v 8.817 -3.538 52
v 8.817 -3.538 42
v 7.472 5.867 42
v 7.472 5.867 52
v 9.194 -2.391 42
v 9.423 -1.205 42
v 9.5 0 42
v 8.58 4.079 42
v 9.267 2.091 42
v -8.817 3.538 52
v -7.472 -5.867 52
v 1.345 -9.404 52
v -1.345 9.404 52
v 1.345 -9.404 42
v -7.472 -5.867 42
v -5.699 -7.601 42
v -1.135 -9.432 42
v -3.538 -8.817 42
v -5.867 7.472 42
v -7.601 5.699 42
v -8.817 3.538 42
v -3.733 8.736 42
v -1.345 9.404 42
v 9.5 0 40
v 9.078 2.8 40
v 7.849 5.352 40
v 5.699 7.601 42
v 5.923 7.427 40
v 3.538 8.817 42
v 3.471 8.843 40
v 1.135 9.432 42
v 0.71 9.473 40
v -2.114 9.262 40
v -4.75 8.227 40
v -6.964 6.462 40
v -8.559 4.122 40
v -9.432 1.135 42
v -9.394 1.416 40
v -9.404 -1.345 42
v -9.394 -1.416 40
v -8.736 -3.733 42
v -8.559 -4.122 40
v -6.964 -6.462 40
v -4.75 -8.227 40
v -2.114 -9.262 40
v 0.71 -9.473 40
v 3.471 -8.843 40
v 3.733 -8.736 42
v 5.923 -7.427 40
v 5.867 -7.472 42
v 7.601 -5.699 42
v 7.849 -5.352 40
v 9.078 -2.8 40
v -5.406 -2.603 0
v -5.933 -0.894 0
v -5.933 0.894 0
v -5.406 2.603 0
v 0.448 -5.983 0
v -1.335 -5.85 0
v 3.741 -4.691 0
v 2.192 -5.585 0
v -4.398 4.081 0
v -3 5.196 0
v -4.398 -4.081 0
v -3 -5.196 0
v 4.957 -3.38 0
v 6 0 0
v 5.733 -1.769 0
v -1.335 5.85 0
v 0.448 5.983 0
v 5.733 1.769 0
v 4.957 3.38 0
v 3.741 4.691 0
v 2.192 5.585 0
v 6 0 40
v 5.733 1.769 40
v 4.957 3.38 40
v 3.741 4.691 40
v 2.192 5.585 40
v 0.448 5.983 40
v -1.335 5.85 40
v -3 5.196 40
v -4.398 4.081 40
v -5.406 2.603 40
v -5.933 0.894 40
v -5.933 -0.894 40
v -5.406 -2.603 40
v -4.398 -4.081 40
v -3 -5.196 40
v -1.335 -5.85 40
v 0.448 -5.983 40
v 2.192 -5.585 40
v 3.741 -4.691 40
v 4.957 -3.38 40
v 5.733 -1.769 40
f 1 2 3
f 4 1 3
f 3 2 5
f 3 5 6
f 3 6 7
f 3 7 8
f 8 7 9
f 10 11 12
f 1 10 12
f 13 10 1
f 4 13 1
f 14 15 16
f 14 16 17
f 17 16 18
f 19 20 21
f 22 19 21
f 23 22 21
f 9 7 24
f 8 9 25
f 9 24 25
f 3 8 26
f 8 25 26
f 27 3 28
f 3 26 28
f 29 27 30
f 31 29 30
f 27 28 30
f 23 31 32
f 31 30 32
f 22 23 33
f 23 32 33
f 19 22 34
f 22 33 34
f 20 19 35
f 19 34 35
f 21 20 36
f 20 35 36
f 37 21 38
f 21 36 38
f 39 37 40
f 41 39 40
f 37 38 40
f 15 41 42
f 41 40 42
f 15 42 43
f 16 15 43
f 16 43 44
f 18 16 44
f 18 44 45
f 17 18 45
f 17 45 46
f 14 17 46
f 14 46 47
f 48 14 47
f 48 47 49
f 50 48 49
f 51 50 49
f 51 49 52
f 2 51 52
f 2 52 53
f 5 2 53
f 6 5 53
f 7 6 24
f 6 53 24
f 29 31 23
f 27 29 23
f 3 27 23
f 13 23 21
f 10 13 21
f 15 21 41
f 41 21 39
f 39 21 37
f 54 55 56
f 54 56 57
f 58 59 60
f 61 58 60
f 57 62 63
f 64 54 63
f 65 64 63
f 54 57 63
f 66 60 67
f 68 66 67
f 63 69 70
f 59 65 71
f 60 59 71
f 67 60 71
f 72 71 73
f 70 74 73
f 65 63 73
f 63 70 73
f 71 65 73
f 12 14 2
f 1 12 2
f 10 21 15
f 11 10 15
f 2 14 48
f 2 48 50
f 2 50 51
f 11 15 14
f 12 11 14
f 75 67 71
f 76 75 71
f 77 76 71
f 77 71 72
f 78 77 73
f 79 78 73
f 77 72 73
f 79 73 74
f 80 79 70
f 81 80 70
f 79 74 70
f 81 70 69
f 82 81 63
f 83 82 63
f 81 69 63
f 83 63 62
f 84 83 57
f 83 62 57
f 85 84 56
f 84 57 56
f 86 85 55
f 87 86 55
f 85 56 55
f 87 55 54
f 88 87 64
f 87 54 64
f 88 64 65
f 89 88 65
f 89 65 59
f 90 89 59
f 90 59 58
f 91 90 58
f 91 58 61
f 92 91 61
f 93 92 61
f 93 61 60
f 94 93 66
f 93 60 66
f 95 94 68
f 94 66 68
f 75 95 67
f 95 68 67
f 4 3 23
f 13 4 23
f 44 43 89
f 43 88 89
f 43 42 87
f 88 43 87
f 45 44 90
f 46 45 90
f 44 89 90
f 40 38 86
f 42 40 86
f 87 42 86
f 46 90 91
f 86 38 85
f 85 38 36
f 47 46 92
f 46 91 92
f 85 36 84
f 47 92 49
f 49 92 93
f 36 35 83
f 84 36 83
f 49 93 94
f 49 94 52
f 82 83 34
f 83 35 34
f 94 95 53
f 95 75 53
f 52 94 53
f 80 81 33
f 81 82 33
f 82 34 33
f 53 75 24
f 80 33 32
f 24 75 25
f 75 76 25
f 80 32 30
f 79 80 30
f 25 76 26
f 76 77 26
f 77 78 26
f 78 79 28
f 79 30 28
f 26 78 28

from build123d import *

# Parameters (mm, degrees)
CROQUIS1_R              = 6
SALIENTE_EXTRUIR1_DEPTH = 40
CROQUIS2_R              = 9.5
SALIENTE_EXTRUIR2_DEPTH = 2
SALIENTE_EXTRUIR3_DEPTH = 10


with BuildPart() as part:
    # Croquis1 → Saliente-Extruir1 (new body)
    with BuildSketch(Plane.XY):
        Circle(CROQUIS1_R)
    extrude(amount=SALIENTE_EXTRUIR1_DEPTH)

    # Croquis2 → Saliente-Extruir2 (add)
    with BuildSketch(Plane.XY.offset(40)):
        Circle(CROQUIS2_R)
    extrude(amount=SALIENTE_EXTRUIR2_DEPTH)

    # Croquis3 → Saliente-Extruir3 (add)
    with BuildSketch(Plane.XY.offset(42)):
        Polygon((-1.344767868, 9.404339391), (-8.816780752, 3.53756656), (-7.472012885, -5.866772831), (1.344767868, -9.404339391), (8.816780752, -3.53756656), (7.472012885, 5.866772831), align=None)
    extrude(amount=SALIENTE_EXTRUIR3_DEPTH)


solid = part.part
